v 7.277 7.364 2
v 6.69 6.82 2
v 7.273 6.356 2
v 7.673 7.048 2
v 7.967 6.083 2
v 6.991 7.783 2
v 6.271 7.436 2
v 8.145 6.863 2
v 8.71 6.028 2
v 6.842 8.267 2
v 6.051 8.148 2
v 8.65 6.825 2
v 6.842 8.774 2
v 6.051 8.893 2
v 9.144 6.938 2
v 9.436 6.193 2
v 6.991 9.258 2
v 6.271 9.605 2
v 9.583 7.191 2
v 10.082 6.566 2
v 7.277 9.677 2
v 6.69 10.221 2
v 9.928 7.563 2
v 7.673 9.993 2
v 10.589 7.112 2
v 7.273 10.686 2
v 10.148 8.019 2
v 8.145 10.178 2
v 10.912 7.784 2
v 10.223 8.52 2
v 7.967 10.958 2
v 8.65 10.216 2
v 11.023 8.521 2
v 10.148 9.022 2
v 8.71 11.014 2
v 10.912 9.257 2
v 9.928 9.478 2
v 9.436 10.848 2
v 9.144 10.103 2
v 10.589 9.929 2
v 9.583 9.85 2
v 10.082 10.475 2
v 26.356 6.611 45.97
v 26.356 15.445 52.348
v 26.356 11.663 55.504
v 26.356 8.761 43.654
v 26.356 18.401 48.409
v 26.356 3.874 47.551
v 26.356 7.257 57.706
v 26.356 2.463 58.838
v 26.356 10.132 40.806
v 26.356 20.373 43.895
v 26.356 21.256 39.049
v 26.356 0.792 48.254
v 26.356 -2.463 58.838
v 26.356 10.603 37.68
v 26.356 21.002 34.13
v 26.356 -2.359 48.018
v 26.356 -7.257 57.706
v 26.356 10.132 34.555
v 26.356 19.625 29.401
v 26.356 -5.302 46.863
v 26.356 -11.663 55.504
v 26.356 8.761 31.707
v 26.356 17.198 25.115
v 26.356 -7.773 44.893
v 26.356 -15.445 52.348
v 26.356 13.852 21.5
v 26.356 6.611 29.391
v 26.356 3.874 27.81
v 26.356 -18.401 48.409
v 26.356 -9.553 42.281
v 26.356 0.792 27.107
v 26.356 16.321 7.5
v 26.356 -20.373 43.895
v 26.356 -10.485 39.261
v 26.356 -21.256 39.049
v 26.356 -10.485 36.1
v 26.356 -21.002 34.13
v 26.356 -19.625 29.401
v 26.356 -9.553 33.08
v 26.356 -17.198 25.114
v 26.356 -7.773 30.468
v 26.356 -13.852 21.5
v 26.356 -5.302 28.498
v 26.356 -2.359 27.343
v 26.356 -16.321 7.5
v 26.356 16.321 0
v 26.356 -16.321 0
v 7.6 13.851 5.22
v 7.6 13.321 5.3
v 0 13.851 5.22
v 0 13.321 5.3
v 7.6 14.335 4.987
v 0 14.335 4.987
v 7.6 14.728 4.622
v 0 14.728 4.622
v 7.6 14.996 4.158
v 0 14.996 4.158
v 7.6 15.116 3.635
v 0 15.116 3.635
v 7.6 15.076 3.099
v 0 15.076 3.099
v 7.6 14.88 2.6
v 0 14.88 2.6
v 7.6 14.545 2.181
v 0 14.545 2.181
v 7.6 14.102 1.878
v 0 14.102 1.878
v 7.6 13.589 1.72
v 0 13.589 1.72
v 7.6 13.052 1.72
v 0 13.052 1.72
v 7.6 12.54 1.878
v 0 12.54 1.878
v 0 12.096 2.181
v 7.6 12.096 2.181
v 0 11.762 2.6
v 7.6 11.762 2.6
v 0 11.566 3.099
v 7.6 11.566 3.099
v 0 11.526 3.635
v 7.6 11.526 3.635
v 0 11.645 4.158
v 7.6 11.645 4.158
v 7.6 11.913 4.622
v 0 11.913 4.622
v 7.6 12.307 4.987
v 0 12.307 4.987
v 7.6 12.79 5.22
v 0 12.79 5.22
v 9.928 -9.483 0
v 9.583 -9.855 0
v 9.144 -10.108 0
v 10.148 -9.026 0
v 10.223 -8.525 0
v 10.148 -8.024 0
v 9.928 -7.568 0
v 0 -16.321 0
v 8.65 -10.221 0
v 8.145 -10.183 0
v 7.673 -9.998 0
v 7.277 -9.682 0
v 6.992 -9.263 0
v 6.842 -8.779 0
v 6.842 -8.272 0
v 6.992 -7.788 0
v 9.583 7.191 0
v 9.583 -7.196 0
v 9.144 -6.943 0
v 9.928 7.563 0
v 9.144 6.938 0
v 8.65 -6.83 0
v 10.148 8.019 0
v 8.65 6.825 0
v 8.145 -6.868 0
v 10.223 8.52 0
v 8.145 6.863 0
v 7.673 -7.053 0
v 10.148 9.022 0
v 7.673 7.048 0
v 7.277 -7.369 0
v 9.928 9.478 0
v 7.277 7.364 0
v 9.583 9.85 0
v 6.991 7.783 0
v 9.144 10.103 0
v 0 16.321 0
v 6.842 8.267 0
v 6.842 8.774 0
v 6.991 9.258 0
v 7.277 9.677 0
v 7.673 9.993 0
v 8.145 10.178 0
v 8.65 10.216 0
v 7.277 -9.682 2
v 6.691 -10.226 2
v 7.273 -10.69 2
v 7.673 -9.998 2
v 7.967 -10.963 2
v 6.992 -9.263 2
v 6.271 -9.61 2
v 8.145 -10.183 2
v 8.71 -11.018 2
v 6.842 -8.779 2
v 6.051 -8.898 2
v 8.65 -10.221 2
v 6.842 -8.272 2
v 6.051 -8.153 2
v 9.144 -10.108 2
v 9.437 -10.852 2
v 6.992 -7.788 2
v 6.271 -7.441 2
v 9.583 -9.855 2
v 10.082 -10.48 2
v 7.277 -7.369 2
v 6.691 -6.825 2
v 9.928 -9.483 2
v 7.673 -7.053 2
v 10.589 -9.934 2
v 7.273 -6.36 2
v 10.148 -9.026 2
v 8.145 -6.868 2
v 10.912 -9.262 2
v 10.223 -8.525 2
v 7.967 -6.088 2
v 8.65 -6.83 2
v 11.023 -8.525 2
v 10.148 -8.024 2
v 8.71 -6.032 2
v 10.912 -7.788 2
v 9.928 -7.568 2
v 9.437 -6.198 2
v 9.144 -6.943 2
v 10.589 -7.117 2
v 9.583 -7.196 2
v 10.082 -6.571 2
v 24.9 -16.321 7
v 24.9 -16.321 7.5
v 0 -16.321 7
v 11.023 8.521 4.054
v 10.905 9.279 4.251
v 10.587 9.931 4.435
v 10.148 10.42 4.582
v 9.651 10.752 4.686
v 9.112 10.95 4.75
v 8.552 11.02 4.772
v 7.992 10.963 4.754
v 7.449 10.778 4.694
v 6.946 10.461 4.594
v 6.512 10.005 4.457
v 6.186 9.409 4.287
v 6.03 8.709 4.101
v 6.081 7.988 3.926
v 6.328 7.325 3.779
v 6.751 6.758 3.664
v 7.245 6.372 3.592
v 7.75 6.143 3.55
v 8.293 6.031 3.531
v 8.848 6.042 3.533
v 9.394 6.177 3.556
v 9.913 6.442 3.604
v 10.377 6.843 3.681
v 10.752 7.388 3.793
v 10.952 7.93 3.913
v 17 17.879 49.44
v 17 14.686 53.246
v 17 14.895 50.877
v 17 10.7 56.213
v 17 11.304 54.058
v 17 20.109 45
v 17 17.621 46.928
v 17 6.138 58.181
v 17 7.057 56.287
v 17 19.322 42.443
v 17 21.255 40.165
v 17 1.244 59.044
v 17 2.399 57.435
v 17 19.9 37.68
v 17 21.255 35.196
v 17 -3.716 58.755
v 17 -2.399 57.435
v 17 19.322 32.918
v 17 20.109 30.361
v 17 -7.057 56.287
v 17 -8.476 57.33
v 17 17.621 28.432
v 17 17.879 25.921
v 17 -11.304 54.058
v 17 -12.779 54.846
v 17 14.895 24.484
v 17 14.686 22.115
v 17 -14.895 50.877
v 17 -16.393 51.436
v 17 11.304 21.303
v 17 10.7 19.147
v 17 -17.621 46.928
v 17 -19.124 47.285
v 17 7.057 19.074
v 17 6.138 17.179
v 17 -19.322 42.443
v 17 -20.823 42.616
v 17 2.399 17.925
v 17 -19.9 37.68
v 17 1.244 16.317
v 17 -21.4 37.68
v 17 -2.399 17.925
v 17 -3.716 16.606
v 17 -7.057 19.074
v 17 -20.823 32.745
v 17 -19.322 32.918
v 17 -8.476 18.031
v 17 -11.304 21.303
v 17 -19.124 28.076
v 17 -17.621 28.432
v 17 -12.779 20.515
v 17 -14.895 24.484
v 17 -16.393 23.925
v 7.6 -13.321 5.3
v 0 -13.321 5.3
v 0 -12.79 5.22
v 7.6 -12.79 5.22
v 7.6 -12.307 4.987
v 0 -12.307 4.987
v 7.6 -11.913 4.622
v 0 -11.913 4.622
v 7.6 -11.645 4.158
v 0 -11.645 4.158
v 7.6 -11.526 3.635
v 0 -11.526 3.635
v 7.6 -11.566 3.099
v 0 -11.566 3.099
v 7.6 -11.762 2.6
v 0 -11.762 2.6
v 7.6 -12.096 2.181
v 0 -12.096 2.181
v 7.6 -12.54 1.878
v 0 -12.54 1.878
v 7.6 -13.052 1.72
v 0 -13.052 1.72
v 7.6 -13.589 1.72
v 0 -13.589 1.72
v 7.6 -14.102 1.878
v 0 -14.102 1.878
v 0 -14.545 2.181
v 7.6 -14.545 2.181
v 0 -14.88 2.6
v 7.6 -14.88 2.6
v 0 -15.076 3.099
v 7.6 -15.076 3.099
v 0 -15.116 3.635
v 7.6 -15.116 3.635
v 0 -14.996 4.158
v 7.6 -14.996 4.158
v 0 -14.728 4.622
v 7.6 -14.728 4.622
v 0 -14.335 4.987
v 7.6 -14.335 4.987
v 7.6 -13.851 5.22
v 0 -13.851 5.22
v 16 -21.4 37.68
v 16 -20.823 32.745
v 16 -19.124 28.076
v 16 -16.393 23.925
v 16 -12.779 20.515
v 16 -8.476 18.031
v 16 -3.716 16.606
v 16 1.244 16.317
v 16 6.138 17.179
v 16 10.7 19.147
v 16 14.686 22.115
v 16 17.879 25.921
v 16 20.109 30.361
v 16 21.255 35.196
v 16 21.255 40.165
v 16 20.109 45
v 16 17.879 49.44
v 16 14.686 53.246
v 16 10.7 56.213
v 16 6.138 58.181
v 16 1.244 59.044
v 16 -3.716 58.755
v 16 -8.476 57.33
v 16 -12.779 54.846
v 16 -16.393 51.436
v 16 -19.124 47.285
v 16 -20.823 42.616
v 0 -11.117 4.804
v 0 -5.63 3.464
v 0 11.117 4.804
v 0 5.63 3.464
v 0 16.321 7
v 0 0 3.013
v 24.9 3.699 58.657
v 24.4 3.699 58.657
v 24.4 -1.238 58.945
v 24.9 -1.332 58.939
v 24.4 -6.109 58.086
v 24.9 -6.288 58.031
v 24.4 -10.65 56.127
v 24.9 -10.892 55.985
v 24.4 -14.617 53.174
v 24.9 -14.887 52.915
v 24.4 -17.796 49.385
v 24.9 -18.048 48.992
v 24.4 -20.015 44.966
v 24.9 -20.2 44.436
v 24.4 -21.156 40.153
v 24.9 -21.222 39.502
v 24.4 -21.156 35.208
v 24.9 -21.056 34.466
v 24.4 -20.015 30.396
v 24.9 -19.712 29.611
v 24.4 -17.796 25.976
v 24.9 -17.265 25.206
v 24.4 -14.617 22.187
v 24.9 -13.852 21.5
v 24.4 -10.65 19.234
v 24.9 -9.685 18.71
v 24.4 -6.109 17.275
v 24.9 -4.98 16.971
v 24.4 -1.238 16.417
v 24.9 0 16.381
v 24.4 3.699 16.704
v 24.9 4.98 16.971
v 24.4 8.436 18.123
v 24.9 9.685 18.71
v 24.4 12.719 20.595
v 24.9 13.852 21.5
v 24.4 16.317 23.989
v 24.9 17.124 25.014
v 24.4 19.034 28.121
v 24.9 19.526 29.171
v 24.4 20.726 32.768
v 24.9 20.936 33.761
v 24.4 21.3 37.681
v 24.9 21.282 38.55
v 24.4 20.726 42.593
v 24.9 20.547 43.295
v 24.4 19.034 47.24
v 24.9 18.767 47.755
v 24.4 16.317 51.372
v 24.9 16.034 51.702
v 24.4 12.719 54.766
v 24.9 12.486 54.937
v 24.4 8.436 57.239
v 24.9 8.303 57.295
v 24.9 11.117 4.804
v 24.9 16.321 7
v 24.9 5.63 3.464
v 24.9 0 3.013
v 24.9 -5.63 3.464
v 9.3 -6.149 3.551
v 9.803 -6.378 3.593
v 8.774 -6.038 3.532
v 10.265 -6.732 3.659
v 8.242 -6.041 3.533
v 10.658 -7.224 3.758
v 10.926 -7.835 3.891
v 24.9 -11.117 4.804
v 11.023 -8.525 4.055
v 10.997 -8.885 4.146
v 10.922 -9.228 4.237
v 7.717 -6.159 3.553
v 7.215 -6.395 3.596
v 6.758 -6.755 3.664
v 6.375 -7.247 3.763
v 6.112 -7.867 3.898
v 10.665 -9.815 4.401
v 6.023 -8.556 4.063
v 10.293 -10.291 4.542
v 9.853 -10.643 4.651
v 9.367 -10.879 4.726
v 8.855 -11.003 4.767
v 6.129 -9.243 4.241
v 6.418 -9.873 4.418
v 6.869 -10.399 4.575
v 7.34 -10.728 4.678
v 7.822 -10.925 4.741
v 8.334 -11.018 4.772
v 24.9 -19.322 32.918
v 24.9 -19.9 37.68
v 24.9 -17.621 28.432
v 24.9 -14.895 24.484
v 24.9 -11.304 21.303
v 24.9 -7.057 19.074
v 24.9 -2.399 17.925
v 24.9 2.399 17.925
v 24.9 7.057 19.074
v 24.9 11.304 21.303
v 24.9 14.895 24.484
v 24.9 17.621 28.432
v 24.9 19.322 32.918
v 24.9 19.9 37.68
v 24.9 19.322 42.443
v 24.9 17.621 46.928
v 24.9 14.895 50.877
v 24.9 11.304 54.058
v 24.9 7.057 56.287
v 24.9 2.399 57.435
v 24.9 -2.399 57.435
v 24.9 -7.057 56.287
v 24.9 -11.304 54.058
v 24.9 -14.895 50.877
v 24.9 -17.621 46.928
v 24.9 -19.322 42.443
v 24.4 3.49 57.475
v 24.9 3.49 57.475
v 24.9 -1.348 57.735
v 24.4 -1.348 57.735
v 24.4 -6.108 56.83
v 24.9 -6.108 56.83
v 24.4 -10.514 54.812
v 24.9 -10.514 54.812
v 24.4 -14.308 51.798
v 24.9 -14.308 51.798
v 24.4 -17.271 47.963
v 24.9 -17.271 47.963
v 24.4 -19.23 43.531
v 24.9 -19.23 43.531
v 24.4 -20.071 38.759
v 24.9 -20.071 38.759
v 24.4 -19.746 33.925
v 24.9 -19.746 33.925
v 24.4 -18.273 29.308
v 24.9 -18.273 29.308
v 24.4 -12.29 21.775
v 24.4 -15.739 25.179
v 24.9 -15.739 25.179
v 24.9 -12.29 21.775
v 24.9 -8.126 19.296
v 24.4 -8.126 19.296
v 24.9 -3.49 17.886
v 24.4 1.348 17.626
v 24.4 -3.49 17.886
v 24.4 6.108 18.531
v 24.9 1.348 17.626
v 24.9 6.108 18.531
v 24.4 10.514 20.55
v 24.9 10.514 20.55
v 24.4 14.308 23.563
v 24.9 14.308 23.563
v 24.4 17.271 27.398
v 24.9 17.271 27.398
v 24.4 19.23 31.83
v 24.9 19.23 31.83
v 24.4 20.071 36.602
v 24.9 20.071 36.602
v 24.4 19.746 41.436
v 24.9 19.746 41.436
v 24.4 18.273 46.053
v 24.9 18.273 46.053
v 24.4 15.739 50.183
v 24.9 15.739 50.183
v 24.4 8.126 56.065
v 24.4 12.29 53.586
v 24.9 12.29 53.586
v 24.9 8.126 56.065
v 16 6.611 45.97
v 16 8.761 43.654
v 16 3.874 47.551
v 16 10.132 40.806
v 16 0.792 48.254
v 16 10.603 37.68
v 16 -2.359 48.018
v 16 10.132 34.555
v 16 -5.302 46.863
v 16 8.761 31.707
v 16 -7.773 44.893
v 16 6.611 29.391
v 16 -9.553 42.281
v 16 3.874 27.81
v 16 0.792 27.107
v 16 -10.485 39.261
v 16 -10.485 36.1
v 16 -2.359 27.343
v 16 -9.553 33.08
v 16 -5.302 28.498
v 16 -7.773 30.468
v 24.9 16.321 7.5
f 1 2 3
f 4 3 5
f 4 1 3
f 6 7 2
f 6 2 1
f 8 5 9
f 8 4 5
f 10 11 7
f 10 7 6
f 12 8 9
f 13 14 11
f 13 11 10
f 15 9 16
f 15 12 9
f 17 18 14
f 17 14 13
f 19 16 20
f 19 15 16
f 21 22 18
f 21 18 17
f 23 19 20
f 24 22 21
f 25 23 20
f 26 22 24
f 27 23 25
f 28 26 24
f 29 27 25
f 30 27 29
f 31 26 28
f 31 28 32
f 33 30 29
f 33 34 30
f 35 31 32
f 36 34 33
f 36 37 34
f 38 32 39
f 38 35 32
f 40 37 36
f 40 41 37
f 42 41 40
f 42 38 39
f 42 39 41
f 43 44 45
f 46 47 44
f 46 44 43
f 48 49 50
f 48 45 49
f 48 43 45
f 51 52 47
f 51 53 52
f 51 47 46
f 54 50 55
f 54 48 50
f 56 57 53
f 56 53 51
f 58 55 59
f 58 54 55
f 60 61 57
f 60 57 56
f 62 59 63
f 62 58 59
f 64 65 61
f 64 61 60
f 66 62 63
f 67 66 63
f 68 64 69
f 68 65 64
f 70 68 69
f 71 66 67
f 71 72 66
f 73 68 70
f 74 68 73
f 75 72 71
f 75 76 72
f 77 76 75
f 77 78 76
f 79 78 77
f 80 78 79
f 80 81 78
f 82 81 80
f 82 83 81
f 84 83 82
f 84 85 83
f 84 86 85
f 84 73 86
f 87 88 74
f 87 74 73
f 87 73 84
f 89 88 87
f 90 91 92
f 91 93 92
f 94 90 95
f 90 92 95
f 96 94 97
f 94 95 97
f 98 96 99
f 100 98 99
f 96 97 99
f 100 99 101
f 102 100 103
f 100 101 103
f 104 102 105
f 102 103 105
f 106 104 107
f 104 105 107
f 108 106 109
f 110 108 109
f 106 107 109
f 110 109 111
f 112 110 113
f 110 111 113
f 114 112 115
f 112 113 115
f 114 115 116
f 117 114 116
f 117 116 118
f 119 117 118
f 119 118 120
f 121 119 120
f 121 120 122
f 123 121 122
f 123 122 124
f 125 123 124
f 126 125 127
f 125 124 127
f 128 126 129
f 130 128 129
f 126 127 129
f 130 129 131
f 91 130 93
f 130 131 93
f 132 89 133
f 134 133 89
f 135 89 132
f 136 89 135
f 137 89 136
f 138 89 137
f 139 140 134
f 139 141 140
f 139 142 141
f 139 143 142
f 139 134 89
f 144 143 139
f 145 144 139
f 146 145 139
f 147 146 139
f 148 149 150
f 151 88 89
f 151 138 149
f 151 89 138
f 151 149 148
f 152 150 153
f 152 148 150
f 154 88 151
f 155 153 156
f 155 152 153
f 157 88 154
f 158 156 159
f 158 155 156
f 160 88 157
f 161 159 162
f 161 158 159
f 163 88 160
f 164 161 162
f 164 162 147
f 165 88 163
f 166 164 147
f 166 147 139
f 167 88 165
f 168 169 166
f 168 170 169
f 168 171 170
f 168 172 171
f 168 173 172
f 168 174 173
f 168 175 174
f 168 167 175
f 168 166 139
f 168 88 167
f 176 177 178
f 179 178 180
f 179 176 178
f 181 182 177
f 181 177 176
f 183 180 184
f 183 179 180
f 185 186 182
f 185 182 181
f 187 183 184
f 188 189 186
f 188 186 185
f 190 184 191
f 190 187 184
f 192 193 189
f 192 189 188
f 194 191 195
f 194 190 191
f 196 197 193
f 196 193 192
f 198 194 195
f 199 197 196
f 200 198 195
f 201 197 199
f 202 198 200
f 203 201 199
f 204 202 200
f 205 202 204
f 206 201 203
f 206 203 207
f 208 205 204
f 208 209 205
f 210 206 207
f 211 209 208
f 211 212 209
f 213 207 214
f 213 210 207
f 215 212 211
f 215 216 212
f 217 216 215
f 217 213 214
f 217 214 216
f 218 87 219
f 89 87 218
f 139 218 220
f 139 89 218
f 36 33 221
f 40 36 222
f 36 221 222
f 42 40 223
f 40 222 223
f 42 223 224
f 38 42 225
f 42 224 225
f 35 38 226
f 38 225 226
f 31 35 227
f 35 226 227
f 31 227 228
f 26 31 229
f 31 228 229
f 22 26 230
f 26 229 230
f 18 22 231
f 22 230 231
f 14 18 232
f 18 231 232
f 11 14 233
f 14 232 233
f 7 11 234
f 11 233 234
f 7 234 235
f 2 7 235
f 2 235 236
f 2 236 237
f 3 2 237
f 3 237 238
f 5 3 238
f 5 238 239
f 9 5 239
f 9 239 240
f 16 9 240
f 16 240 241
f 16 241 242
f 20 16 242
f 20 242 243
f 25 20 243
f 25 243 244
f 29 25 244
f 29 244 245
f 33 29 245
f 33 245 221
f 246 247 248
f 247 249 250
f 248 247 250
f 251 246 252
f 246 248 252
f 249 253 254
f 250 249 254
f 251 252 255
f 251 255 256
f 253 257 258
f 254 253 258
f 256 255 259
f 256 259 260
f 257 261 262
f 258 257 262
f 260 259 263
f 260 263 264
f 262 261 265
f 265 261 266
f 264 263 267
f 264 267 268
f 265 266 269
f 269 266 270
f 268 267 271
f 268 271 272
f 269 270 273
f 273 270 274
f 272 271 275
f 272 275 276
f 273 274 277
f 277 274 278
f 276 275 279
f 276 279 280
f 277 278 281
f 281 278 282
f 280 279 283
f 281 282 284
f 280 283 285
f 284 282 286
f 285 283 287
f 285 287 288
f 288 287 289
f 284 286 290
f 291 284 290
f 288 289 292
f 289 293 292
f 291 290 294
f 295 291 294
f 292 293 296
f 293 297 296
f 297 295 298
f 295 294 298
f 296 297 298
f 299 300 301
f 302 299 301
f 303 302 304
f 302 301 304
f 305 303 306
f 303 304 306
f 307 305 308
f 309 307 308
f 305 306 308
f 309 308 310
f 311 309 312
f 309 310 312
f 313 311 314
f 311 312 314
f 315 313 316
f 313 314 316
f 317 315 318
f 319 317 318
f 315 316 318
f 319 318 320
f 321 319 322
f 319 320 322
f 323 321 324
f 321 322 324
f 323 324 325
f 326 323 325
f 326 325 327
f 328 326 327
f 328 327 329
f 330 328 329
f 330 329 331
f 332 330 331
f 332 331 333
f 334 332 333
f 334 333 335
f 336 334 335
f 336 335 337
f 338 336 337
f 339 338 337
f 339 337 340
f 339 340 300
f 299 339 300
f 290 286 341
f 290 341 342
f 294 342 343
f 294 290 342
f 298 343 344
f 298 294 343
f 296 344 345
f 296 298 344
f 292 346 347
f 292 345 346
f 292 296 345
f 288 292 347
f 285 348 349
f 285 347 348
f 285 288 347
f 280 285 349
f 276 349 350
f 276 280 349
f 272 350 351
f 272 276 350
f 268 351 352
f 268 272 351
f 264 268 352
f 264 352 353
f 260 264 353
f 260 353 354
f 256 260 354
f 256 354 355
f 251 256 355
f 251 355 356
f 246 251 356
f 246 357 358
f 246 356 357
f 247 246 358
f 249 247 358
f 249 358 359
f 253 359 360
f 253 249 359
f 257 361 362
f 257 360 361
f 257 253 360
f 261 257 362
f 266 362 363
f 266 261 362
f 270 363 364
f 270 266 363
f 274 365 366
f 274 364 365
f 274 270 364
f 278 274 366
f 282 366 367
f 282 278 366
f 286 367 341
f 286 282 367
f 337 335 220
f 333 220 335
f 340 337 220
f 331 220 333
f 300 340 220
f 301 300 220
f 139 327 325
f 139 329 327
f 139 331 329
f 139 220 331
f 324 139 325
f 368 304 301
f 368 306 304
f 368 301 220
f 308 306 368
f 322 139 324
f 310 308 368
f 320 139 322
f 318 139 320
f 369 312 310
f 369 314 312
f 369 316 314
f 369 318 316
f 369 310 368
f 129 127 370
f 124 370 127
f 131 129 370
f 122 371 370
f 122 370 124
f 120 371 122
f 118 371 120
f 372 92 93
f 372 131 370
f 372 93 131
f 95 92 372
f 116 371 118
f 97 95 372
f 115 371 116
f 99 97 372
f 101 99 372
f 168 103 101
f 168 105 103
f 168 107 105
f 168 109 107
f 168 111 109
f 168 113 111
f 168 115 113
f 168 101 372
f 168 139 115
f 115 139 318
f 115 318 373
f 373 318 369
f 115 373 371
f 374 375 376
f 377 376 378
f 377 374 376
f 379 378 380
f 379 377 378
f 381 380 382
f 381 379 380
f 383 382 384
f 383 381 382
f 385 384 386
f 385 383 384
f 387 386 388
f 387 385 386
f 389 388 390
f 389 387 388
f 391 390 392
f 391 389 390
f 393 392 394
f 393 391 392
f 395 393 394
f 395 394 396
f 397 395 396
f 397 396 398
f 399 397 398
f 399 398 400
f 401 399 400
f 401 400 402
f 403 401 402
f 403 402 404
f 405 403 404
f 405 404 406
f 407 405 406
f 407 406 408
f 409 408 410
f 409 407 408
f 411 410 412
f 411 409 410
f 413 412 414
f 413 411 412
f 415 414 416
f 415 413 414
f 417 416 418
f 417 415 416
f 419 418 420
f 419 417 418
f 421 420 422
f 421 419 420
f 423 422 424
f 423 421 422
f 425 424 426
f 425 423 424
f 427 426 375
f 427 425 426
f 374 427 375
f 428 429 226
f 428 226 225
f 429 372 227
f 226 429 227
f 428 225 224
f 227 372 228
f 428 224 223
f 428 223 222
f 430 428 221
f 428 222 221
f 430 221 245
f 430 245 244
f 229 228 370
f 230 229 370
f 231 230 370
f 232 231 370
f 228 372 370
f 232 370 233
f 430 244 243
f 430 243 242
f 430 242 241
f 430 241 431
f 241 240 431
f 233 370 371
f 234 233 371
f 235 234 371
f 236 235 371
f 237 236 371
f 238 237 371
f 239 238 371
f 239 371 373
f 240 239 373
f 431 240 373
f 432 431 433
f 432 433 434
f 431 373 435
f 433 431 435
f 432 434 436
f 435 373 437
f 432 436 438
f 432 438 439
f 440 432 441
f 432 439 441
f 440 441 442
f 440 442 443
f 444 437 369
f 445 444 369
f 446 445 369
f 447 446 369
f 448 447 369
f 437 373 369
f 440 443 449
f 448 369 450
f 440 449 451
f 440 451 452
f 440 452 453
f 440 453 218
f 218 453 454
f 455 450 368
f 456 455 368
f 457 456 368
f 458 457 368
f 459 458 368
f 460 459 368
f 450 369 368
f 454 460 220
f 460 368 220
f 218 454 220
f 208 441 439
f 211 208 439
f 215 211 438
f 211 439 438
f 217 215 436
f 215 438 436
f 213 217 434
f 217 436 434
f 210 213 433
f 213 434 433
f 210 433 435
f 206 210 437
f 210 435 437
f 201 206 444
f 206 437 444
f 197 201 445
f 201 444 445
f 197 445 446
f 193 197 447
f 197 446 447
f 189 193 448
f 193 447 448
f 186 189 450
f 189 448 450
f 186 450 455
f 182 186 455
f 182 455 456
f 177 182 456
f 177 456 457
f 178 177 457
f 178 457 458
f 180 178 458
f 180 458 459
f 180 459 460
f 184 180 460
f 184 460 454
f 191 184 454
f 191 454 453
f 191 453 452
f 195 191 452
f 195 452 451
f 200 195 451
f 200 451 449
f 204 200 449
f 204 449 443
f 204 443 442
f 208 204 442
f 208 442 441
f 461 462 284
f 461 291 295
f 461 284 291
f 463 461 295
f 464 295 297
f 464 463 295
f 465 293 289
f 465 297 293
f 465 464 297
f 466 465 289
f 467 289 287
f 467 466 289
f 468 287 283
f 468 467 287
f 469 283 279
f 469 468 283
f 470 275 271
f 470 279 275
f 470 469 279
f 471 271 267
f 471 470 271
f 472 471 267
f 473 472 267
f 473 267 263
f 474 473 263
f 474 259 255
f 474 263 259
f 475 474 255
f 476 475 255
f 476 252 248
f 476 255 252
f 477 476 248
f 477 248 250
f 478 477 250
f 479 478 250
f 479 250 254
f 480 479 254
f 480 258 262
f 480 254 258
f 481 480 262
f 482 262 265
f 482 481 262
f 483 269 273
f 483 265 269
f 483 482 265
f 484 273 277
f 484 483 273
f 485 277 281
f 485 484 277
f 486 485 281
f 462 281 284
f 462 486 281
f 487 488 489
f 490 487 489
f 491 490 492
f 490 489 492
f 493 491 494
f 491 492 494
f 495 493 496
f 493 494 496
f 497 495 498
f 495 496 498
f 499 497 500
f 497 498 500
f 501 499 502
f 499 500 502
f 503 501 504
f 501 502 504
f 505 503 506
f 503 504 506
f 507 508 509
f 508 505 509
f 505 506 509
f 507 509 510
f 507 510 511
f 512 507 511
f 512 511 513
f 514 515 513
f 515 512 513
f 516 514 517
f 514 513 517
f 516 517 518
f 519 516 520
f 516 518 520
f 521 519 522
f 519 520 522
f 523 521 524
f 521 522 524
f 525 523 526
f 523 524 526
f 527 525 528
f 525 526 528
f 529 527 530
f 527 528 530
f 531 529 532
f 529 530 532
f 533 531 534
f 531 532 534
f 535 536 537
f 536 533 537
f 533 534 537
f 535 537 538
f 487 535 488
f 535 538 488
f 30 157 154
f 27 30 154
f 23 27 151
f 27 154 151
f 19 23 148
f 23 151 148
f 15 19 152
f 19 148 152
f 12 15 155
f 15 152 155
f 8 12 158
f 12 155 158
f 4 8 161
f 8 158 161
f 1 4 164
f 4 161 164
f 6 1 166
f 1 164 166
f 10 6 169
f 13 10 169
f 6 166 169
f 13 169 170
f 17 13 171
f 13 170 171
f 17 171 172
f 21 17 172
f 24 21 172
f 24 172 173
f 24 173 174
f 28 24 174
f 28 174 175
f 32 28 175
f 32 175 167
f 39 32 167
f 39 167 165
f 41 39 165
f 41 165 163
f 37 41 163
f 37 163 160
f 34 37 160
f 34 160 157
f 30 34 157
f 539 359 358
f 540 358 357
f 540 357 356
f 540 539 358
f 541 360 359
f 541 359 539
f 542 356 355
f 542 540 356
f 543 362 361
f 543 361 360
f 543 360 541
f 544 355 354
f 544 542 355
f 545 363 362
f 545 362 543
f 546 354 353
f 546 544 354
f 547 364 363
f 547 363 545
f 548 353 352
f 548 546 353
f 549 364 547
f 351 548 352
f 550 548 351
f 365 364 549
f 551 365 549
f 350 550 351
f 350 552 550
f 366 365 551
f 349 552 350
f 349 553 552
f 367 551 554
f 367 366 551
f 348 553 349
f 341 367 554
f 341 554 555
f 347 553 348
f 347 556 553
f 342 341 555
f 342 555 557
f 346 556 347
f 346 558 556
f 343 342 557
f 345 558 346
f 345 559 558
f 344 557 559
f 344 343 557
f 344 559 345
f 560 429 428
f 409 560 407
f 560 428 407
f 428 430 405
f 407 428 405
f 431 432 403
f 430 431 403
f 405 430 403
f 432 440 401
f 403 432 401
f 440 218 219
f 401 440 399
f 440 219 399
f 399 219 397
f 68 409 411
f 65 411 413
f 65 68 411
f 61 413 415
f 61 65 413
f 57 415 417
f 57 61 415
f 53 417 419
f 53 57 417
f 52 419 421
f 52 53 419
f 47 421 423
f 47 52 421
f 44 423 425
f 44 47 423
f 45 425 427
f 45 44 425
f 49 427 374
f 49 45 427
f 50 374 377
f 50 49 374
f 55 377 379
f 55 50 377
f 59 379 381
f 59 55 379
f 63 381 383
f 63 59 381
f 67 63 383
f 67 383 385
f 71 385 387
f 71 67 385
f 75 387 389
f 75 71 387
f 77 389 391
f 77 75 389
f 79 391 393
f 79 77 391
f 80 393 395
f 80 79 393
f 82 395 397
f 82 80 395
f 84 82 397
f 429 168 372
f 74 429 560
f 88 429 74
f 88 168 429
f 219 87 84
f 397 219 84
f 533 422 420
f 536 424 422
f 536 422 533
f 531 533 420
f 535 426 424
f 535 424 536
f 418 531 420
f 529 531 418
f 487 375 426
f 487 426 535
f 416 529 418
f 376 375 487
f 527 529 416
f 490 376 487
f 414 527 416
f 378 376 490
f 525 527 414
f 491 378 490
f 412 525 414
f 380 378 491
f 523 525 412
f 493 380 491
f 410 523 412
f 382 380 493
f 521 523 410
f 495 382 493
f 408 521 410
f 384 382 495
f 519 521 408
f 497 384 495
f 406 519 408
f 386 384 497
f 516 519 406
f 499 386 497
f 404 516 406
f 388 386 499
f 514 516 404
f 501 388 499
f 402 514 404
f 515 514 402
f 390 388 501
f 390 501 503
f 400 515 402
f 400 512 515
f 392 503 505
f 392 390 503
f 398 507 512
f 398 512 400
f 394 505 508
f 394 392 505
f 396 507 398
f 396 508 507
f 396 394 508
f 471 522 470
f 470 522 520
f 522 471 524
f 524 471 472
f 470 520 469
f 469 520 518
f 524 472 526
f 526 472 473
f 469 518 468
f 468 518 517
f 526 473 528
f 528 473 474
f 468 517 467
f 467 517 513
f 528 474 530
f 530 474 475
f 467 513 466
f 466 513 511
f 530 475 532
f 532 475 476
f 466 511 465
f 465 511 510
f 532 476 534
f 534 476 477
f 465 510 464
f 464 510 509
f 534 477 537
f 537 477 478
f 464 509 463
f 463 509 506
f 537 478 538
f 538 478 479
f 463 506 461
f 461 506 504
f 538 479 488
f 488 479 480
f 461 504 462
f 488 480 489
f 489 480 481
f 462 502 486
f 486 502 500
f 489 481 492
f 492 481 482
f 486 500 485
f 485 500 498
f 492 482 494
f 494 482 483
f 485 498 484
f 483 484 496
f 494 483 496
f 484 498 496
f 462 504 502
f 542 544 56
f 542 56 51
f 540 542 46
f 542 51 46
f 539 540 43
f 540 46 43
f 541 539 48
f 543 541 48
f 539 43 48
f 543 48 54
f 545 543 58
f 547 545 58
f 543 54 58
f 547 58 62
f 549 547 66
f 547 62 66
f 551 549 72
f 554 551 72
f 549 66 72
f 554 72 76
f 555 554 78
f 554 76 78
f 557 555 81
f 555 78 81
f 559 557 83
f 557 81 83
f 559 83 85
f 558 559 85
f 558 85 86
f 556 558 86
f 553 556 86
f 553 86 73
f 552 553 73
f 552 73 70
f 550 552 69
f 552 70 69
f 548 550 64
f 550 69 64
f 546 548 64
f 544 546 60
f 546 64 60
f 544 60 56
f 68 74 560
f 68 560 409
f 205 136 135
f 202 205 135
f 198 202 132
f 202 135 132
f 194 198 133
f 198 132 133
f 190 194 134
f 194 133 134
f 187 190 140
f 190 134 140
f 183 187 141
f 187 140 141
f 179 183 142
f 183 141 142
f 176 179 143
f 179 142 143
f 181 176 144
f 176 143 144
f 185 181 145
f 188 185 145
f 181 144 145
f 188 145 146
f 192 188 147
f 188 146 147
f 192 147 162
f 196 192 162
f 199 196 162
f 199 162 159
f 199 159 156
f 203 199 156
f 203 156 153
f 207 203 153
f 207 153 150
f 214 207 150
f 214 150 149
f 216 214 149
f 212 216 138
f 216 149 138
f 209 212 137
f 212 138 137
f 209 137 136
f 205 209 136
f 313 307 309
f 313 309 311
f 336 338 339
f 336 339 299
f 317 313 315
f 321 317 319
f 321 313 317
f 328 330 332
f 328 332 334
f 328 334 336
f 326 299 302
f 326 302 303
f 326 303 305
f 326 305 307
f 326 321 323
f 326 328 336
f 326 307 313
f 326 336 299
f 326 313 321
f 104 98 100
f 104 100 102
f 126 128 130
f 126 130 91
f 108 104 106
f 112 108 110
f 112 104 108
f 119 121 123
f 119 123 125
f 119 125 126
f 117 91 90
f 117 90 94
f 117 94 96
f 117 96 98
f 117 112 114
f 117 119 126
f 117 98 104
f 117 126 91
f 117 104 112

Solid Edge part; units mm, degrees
sketch "Sketch1" plane through (0, 0, 0) normal (0, 0, 1) x (1, 0, 0)
  line L0 (0, -16.3207) -> (0, 16.3207)
  line L1 (0, 16.3207) -> (26.3559, 16.3207)
  line L2 (26.3559, 16.3207) -> (26.3559, -16.3207)
  line L3 (26.3559, -16.3207) -> (0, -16.3207)
extrude "Protrusion1" add sketch "Sketch1" along normal up to vertex (7.5 mm away)
sketch "Sketch2" plane through (0, 12.45, 7.5) normal (0, 0, 1) x (1, 0, 0)
  circle A0 centre (8.5231, -3.9294) radius 2.5
  circle A1 centre (8.5233, -20.9753) radius 2.5
extrude "Cutout1" cut sketch "Sketch2" against normal blind 5.5
sketch "Sketch3" plane through (0, 0, 3.5) normal (-1, 0, 0) x (0, 0, 1)
  line L0 (4, 16.3207) -> (4, -16.3207)
  line L1 (4, -16.3207) -> (3.5, -16.3207)
  arc A0 (3.5, -16.3207) -> (3.5, 16.3207) centre (34.9133, 0) cw
  line L2 (4, 16.3207) -> (3.5, 16.3207)
extrude "Cutout2" cut sketch "Sketch3" against normal blind 24.9
sketch "Sketch4" plane through (26.3559, 27.5207, 3.5) normal (1, 0, 0) x (0, 1, 0)
  line L0 (-43.8414, 4) -> (-43.8414, -3.5)
  line L1 (-43.8414, -3.5) -> (-11.2, -3.5)
  line L2 (-11.2, -3.5) -> (-11.2, 4)
  line L3 (-11.2, 4) -> (-13.6685, 18)
  arc A0 (-41.3728, 18) -> (-13.6685, 18) centre (-27.5207, 34.1805) cw
  line L4 (-43.8414, 4) -> (-41.3728, 18)
extrude "Protrusion2" add sketch "Sketch4" against normal up to vertex (1.4559 mm away)
sketch "Sketch5" plane through (0, 13.7603, 0) normal (0, 0, -1) x (1, 0, 0)
  circle A0 centre (8.5233, 22.2857) radius 1.7
  circle A1 centre (8.5231, 5.2398) radius 1.7
extrude "Cutout3" cut sketch "Sketch5" against normal up to next
sketch "Sketch6" plane through (0, 0, 3.5) normal (-1, 0, 0) x (0, 0, 1)
  circle A0 centre (0, -13.3207) radius 1.8
  circle A1 centre (0, 13.3207) radius 1.8
extrude "Cutout4" cut sketch "Sketch6" against normal blind 7.6
sketch "Sketch7" plane through (24.9, 24.9, 30.7298) normal (-1, 0, 0) x (0, 0.1736482, 0.9848078)
  circle A0 centre (2.5213, -25.7287) radius 21.3
  circle A1 centre (2.5213, -25.7287) radius 20.1
  dimension "D1" = 1.2
extrude "Protrusion3" add sketch "Sketch7" along normal blind 0.5
sketch "Sketch8" plane through (24.9, 24.9, 38.9028) normal (-1, 0, 0) x (0, -1, 0)
  circle A0 centre (24.9, -1.2224) radius 19.9
  dimension "D1" = 0.2
extrude "Protrusion4" add sketch "Sketch8" along normal blind 7.9
sketch "Sketch9" plane through (17, 17, 38.9028) normal (-1, 0, 0) x (0, -1, 0)
  circle A0 centre (17, -1.2224) radius 21.4
  dimension "D1" = 1.5
extrude "Protrusion5" add sketch "Sketch9" along normal blind 1
sketch "Sketch10" plane through (26.3559, 27.5207, 10.5562) normal (1, 0, 0) x (0, 1, 0)
  circle A0 centre (-27.5207, 27.1243) radius 10.6033
extrude "Cutout5" cut sketch "Sketch10" against normal up to next
